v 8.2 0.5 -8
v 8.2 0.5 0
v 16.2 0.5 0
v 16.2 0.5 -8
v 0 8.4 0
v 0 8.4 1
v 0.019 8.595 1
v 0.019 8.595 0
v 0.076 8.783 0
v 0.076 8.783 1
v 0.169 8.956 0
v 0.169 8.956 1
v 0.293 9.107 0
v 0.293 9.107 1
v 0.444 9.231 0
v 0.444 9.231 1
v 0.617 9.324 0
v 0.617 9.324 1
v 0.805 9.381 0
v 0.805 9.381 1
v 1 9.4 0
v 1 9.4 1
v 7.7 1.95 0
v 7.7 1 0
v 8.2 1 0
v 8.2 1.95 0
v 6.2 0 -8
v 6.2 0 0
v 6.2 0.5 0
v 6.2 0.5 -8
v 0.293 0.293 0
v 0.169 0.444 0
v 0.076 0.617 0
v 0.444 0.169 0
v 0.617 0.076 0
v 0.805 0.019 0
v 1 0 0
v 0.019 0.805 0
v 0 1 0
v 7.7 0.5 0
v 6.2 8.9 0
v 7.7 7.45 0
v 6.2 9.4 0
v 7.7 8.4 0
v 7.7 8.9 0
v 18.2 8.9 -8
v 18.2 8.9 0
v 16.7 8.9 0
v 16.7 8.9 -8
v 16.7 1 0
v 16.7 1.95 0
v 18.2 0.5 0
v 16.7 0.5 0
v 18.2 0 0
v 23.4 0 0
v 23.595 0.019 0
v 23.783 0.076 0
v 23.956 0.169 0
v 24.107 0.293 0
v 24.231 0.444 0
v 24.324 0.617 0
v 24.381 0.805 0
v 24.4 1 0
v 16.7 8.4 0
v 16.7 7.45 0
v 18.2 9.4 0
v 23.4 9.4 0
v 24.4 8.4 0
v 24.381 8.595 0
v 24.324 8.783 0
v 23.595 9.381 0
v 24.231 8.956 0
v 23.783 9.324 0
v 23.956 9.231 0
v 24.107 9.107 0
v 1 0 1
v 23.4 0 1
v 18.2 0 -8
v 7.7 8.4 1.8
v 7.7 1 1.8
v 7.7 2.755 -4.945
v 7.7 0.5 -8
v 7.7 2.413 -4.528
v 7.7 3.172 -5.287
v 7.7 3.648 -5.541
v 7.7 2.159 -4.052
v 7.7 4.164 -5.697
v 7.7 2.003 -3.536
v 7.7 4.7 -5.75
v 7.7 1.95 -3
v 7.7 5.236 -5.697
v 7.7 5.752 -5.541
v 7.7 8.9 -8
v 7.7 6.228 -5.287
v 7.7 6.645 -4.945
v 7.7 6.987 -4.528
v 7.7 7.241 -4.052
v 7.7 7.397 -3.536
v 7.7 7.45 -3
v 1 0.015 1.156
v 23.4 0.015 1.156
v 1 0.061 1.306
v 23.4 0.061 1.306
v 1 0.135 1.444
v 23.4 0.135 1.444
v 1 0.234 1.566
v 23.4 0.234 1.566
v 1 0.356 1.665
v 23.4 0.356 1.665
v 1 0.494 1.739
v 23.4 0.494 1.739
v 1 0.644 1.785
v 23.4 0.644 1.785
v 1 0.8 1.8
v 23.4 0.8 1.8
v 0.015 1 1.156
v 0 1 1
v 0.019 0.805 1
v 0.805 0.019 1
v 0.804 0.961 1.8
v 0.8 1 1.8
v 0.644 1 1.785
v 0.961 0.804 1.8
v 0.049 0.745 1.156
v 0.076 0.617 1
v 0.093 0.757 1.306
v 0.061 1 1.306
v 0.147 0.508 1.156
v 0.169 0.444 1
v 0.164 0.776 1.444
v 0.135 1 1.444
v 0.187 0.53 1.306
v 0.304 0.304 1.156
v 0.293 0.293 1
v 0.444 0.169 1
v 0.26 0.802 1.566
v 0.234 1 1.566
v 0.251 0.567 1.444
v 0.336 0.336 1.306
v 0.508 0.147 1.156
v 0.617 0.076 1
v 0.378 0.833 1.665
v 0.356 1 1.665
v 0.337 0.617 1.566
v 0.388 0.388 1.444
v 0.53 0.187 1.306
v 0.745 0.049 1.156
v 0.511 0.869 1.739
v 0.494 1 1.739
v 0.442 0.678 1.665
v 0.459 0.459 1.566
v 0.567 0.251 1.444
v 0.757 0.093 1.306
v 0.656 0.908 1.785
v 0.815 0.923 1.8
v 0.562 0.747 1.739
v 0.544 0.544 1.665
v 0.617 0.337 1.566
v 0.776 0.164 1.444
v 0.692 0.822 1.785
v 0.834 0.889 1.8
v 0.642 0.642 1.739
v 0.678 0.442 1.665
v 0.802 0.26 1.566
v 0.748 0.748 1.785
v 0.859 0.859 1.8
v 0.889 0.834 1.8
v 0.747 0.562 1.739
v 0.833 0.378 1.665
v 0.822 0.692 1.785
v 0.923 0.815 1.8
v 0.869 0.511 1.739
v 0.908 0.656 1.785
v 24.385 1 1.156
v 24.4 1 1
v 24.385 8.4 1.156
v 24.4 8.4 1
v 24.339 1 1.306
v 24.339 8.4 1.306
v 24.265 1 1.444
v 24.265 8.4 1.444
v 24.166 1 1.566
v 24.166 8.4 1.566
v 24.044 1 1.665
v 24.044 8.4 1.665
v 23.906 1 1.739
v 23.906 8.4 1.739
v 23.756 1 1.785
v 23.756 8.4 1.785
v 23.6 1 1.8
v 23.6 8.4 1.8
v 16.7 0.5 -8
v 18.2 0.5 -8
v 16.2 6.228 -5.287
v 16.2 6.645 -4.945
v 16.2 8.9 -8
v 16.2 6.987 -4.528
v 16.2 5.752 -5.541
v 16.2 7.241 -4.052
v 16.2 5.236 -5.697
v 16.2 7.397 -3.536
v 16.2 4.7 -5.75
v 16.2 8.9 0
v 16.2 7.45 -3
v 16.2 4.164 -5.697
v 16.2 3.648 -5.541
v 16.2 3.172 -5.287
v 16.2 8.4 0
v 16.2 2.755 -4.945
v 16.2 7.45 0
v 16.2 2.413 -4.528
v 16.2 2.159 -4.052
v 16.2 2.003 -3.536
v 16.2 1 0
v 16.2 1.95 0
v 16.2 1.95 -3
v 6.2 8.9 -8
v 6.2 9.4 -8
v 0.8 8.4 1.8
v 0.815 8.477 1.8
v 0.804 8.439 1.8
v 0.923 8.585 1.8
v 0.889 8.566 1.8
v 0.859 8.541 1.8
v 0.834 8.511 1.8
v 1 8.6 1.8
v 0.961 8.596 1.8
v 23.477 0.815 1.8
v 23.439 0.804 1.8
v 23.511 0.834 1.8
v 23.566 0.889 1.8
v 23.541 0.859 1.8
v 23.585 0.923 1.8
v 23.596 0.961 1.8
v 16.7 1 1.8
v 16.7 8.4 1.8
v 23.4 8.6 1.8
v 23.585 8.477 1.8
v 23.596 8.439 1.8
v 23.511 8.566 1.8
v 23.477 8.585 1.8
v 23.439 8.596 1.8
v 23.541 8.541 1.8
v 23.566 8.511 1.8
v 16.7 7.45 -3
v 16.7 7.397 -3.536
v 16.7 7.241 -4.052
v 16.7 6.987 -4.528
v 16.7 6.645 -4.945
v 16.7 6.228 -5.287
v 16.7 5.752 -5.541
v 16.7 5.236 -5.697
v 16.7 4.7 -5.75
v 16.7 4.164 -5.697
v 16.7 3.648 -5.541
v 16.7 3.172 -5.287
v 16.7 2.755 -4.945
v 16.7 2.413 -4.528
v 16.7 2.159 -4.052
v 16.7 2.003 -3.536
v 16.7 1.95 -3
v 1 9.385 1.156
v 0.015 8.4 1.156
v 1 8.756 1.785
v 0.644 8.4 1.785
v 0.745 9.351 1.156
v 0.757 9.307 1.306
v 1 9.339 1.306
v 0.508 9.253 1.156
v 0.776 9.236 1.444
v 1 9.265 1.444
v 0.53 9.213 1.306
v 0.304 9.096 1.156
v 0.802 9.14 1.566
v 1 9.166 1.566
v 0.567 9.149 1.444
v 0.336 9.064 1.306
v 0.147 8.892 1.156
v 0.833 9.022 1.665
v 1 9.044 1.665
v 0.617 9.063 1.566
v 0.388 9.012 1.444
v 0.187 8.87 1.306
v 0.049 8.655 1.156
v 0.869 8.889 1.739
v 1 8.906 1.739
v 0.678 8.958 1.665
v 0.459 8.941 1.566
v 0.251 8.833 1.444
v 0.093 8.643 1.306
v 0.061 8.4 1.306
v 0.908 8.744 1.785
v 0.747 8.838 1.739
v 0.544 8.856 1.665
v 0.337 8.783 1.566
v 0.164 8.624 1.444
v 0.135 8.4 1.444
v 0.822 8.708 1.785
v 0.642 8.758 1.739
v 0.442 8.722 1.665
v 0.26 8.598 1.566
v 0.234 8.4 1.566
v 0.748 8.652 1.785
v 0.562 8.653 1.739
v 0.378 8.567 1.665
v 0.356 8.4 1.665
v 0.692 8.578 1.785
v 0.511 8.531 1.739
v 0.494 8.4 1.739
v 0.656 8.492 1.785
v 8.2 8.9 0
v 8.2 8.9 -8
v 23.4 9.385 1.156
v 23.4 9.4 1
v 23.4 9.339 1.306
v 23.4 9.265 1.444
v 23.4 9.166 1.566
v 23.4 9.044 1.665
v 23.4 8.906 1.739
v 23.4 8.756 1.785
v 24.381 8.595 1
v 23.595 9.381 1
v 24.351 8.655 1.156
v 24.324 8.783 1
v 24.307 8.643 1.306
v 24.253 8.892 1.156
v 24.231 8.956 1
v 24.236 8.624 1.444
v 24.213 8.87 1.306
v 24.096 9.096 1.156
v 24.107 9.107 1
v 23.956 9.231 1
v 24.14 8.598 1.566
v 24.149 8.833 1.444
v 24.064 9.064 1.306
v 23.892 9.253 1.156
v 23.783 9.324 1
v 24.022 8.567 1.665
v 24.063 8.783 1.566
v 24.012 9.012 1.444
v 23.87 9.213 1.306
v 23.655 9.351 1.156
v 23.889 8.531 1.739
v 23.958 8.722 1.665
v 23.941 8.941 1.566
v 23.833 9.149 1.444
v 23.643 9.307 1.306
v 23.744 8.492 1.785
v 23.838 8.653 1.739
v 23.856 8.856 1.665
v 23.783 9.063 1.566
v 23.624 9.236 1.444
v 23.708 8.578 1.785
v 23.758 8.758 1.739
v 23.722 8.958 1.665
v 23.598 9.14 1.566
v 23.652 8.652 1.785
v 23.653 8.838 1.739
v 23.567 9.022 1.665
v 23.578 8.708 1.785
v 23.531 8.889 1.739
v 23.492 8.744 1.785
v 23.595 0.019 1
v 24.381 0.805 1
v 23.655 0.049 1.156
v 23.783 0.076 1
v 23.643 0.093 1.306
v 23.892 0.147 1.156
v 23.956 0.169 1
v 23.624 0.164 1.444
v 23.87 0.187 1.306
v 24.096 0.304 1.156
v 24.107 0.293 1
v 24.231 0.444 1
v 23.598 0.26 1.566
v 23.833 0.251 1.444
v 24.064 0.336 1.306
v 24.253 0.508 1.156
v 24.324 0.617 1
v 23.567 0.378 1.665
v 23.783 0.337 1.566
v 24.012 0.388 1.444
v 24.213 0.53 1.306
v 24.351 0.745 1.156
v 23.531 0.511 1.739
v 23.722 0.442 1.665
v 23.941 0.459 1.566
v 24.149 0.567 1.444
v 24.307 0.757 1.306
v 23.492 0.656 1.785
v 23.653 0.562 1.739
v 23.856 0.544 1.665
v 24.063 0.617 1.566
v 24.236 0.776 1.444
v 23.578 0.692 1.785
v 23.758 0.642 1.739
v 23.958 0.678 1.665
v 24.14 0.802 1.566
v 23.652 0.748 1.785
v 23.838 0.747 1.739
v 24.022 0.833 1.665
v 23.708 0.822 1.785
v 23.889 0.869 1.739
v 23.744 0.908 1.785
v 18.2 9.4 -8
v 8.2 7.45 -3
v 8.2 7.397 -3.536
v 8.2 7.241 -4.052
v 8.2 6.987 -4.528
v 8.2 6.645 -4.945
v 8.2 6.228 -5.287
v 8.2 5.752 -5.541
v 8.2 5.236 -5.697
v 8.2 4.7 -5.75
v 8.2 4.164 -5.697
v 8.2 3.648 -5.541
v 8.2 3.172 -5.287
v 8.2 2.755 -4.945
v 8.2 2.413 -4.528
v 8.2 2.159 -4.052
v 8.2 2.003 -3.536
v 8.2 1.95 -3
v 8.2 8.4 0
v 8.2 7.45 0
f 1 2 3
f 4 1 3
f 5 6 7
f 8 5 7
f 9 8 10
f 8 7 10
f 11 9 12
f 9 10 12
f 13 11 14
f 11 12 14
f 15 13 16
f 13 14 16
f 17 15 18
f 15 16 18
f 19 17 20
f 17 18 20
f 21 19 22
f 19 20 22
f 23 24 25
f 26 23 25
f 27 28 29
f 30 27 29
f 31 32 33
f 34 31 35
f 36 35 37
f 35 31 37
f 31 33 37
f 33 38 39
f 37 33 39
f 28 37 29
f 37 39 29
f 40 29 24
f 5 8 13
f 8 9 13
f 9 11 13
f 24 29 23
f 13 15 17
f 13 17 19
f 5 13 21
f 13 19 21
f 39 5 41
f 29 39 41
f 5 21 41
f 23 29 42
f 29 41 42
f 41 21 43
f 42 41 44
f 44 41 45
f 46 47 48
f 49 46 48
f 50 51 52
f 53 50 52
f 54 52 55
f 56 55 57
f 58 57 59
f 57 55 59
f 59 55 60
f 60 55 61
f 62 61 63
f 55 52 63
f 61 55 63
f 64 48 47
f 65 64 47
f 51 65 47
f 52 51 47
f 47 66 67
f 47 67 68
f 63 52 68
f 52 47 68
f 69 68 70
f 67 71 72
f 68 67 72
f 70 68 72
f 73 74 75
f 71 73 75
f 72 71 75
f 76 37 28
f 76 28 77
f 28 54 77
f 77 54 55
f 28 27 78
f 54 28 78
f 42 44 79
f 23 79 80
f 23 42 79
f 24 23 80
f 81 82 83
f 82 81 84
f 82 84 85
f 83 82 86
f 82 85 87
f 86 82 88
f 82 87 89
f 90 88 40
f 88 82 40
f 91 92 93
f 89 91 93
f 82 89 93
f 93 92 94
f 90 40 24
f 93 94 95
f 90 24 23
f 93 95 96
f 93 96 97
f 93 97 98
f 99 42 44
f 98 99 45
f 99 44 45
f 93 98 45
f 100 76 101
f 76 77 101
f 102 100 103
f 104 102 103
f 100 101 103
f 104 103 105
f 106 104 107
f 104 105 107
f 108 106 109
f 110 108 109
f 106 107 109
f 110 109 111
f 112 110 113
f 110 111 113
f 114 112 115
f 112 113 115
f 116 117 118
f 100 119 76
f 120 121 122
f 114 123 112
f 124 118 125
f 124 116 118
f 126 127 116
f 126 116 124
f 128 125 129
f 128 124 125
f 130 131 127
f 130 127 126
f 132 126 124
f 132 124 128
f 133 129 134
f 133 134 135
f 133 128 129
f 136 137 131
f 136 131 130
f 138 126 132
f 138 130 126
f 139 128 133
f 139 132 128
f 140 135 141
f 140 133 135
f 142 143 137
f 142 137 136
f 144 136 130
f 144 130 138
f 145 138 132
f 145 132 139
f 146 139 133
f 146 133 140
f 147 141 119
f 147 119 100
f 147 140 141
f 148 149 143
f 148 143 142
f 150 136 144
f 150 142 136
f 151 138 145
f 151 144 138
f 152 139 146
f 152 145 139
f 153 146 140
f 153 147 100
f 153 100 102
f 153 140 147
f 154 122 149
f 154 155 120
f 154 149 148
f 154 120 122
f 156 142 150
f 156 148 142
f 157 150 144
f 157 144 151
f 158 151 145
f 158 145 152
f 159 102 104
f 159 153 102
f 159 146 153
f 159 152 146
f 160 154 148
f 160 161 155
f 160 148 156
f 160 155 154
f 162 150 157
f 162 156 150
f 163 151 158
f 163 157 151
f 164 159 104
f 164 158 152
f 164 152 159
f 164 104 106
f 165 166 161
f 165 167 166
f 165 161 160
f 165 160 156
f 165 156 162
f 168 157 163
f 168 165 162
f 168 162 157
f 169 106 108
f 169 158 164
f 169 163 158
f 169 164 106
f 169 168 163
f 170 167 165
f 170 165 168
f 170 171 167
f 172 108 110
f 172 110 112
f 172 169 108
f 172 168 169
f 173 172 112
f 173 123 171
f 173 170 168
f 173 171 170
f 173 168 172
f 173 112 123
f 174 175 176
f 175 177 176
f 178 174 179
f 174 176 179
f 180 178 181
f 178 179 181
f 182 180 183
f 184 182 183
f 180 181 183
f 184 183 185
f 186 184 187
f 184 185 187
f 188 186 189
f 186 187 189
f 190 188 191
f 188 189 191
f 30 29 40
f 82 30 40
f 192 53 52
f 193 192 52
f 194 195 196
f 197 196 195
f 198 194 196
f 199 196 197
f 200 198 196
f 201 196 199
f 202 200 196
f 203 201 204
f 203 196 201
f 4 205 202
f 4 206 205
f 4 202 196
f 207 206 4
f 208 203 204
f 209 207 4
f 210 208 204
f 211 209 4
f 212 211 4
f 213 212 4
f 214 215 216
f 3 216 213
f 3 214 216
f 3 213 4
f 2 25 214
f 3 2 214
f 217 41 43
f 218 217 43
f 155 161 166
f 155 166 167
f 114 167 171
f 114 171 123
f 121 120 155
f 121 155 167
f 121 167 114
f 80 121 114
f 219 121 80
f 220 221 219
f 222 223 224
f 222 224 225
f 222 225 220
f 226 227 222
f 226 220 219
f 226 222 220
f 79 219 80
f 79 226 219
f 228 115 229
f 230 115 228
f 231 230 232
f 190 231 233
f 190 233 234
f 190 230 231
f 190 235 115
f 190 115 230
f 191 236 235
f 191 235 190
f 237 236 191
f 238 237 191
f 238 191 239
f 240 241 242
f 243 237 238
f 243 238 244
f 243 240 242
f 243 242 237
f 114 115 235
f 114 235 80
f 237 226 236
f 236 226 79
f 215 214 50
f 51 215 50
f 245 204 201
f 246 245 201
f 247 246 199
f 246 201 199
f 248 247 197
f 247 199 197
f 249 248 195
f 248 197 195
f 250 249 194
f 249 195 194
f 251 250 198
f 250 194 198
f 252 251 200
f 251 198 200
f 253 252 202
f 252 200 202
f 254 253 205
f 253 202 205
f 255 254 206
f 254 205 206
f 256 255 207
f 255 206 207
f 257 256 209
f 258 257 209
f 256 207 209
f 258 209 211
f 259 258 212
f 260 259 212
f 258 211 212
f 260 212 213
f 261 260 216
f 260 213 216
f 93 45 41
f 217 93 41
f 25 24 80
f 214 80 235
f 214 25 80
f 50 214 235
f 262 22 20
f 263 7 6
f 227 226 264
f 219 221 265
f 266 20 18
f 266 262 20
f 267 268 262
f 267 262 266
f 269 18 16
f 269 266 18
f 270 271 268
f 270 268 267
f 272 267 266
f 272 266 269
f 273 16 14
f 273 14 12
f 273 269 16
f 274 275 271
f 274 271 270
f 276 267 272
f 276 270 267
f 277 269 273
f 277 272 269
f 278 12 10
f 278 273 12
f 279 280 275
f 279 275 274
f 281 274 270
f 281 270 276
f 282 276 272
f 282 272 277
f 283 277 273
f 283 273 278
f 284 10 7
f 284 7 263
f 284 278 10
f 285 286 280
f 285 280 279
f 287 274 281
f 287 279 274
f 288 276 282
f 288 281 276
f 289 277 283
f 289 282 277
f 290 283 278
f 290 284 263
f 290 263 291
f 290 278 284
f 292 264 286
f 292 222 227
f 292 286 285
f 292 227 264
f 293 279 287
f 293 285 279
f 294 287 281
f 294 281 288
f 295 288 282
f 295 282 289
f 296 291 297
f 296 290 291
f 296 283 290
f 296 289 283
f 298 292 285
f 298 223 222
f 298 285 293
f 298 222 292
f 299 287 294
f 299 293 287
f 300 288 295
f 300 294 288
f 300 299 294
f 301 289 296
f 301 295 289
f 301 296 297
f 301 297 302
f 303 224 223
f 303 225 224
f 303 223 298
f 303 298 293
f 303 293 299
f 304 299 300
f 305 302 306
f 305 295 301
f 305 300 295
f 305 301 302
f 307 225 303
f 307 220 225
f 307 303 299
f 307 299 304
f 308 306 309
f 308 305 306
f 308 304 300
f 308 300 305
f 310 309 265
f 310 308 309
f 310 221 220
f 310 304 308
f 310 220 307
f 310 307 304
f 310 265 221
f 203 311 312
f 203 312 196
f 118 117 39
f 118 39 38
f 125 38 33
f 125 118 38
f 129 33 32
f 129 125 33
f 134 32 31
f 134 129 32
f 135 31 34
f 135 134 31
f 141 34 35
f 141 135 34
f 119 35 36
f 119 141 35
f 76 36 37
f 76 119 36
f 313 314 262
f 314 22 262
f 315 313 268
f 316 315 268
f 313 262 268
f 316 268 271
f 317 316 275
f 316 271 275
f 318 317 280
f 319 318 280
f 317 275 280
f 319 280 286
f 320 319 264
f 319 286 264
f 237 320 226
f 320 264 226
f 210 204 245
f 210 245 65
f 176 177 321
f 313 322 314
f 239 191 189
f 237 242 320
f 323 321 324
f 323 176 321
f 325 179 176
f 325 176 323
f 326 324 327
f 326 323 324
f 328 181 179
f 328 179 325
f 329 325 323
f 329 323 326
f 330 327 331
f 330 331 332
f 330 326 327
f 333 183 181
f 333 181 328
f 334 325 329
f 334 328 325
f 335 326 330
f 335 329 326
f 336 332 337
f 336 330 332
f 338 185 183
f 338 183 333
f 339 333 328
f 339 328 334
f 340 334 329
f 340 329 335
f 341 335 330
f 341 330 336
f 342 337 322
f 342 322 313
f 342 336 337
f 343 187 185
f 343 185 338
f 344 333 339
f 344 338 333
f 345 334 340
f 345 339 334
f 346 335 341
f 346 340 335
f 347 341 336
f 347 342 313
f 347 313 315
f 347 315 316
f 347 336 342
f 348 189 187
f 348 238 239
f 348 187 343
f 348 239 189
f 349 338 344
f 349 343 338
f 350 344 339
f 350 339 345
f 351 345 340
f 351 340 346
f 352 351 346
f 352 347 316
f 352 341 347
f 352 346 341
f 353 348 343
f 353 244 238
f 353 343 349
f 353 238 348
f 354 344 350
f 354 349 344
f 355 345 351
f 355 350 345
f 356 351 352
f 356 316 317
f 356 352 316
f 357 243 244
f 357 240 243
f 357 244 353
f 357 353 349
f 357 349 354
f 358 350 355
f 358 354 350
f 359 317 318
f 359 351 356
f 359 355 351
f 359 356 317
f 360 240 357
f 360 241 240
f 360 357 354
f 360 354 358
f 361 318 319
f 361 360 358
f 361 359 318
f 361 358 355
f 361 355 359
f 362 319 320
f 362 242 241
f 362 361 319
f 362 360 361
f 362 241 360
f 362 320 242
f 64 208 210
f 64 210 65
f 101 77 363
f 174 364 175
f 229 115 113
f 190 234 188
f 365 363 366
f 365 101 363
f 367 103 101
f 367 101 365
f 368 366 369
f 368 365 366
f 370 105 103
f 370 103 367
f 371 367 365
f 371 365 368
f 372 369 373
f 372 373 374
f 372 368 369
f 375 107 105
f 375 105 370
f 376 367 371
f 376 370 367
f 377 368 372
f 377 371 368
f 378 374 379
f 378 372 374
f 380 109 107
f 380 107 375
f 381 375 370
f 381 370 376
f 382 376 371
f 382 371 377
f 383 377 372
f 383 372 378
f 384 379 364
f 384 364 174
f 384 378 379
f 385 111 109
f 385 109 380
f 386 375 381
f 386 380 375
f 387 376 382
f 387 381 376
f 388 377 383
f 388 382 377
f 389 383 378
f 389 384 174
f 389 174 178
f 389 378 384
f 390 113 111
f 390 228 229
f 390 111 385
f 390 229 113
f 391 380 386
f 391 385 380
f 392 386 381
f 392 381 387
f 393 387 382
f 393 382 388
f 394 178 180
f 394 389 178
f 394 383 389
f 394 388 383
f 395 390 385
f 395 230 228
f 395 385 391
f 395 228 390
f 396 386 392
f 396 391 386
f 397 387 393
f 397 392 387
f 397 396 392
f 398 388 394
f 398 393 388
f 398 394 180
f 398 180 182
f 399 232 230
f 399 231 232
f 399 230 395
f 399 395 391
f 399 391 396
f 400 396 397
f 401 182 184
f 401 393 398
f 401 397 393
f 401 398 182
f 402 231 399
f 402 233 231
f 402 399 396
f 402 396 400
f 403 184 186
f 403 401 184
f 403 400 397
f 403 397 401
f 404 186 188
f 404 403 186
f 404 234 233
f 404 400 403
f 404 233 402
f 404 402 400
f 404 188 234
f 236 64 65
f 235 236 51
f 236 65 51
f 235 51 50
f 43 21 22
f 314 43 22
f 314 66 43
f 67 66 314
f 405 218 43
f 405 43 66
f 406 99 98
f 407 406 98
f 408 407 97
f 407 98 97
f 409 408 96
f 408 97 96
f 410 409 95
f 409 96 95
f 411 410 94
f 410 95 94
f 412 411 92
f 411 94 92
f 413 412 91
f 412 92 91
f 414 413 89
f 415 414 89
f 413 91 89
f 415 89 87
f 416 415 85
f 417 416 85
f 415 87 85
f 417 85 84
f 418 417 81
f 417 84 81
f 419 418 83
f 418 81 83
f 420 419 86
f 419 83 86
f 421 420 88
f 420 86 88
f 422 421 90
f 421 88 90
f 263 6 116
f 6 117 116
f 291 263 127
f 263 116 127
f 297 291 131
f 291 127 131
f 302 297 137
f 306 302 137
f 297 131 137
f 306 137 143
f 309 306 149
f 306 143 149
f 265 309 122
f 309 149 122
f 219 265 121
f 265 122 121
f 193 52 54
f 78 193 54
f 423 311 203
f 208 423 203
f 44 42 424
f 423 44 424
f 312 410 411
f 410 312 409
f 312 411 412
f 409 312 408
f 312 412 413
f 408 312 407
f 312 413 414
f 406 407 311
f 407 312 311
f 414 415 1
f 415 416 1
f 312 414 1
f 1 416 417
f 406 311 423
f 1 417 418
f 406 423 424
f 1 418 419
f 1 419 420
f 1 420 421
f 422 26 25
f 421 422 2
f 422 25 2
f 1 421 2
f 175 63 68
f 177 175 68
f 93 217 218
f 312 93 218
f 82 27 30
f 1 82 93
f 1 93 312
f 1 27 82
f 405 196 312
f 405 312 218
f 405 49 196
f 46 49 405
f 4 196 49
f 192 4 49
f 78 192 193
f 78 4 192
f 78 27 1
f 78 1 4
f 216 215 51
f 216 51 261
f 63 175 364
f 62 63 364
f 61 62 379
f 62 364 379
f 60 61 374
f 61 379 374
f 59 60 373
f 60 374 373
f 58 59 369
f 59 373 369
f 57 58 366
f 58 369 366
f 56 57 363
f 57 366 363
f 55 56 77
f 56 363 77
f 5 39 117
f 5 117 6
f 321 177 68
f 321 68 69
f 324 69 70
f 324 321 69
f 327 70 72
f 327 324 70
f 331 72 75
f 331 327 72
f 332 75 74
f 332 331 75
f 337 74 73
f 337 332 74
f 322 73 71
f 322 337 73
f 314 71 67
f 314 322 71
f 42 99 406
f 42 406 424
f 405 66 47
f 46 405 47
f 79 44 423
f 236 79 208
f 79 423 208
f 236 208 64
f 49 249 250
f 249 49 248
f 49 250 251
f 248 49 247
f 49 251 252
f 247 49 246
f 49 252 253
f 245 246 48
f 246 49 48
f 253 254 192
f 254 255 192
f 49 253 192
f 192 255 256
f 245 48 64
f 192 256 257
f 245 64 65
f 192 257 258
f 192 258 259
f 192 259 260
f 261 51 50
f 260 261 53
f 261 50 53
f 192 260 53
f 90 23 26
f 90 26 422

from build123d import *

# Parameters (mm, degrees)
SKETCH001_W     = 24.4
SKETCH001_H     = 9.4
PAD_DEPTH       = 1.8
SKETCH_W        = 8
SKETCH_H        = 8.4
PAD001_DEPTH    = 8
SKETCH002_W     = 9
SKETCH002_H     = 7.4
POCKET_DEPTH    = 1.8
POCKET002_DEPTH = 16.701
FILLET_R        = 1
FILLET001_R     = 0.8


with BuildPart() as part:
    # Sketch001 → Pad (new body)
    with BuildSketch(Plane.XY):
        with Locations((12.2, 4.7)):
            Rectangle(SKETCH001_W, SKETCH001_H)
    extrude(amount=PAD_DEPTH)

    # Sketch (on Face5 of Pad) → Pad001 (join)
    with BuildSketch(Plane(origin=(0, 0, 0), x_dir=(1, 0, 0), z_dir=(0, 0, -1))):
        Polygon((6.2, 0), (6.2, -0.5), (7.7, -0.5), (7.7, -8.9), (6.2, -8.9), (6.2, -9.4), (18.2, -9.4), (18.2, -8.9), (16.7, -8.9), (16.7, -0.5), (18.2, -0.5), (18.2, 0), align=None)
        with Locations((12.2, -4.7)):
            Rectangle(SKETCH_W, SKETCH_H, mode=Mode.SUBTRACT)
    extrude(amount=PAD001_DEPTH)

    # Sketch002 (on Face25 of Pad001) → Pocket (cut)
    with BuildSketch(Plane(origin=(0, 0, 0), x_dir=(1, 0, 0), z_dir=(0, 0, -1))):
        with Locations((12.2, -4.7)):
            Rectangle(SKETCH002_W, SKETCH002_H)
    extrude(amount=-POCKET_DEPTH, mode=Mode.SUBTRACT)

    # Sketch004 → Pocket002 (cut, through all)
    with BuildSketch(Plane(origin=(7.7, 0, 0), x_dir=(0, -1, 0), z_dir=(-1, 0, 0))):
        with BuildLine():
            Line((-7.45, -3), (-7.45, 0))
            Line((-7.45, 0), (-1.95, 0))
            Line((-1.95, 0), (-1.95, -3))
            ThreePointArc((-7.45, -3), (-4.7, -5.75), (-1.95, -3))
        make_face()
    extrude(amount=-POCKET002_DEPTH, mode=Mode.SUBTRACT)

    # Fillet
    fillet_edges = [part.edges().sort_by_distance(p)[0] for p in [
        (0, 0, 0.9),
        (0, 9.4, 0.9),
        (24.4, 0, 0.9),
        (24.4, 9.4, 0.9),
    ]]
    fillet(fillet_edges, radius=FILLET_R)

    # Fillet001
    fillet001_edges = [part.edges().sort_by_distance(p)[0] for p in [
        (0.292893, 0.292893, 1.8),
        (0, 4.7, 1.8),
        (0.292893, 9.107107, 1.8),
        (12.2, 9.4, 1.8),
        (24.107107, 9.107107, 1.8),
        (24.4, 4.7, 1.8),
        (24.107107, 0.292893, 1.8),
        (12.2, 0, 1.8),
    ]]
    fillet(fillet001_edges, radius=FILLET001_R)


solid = part.part
